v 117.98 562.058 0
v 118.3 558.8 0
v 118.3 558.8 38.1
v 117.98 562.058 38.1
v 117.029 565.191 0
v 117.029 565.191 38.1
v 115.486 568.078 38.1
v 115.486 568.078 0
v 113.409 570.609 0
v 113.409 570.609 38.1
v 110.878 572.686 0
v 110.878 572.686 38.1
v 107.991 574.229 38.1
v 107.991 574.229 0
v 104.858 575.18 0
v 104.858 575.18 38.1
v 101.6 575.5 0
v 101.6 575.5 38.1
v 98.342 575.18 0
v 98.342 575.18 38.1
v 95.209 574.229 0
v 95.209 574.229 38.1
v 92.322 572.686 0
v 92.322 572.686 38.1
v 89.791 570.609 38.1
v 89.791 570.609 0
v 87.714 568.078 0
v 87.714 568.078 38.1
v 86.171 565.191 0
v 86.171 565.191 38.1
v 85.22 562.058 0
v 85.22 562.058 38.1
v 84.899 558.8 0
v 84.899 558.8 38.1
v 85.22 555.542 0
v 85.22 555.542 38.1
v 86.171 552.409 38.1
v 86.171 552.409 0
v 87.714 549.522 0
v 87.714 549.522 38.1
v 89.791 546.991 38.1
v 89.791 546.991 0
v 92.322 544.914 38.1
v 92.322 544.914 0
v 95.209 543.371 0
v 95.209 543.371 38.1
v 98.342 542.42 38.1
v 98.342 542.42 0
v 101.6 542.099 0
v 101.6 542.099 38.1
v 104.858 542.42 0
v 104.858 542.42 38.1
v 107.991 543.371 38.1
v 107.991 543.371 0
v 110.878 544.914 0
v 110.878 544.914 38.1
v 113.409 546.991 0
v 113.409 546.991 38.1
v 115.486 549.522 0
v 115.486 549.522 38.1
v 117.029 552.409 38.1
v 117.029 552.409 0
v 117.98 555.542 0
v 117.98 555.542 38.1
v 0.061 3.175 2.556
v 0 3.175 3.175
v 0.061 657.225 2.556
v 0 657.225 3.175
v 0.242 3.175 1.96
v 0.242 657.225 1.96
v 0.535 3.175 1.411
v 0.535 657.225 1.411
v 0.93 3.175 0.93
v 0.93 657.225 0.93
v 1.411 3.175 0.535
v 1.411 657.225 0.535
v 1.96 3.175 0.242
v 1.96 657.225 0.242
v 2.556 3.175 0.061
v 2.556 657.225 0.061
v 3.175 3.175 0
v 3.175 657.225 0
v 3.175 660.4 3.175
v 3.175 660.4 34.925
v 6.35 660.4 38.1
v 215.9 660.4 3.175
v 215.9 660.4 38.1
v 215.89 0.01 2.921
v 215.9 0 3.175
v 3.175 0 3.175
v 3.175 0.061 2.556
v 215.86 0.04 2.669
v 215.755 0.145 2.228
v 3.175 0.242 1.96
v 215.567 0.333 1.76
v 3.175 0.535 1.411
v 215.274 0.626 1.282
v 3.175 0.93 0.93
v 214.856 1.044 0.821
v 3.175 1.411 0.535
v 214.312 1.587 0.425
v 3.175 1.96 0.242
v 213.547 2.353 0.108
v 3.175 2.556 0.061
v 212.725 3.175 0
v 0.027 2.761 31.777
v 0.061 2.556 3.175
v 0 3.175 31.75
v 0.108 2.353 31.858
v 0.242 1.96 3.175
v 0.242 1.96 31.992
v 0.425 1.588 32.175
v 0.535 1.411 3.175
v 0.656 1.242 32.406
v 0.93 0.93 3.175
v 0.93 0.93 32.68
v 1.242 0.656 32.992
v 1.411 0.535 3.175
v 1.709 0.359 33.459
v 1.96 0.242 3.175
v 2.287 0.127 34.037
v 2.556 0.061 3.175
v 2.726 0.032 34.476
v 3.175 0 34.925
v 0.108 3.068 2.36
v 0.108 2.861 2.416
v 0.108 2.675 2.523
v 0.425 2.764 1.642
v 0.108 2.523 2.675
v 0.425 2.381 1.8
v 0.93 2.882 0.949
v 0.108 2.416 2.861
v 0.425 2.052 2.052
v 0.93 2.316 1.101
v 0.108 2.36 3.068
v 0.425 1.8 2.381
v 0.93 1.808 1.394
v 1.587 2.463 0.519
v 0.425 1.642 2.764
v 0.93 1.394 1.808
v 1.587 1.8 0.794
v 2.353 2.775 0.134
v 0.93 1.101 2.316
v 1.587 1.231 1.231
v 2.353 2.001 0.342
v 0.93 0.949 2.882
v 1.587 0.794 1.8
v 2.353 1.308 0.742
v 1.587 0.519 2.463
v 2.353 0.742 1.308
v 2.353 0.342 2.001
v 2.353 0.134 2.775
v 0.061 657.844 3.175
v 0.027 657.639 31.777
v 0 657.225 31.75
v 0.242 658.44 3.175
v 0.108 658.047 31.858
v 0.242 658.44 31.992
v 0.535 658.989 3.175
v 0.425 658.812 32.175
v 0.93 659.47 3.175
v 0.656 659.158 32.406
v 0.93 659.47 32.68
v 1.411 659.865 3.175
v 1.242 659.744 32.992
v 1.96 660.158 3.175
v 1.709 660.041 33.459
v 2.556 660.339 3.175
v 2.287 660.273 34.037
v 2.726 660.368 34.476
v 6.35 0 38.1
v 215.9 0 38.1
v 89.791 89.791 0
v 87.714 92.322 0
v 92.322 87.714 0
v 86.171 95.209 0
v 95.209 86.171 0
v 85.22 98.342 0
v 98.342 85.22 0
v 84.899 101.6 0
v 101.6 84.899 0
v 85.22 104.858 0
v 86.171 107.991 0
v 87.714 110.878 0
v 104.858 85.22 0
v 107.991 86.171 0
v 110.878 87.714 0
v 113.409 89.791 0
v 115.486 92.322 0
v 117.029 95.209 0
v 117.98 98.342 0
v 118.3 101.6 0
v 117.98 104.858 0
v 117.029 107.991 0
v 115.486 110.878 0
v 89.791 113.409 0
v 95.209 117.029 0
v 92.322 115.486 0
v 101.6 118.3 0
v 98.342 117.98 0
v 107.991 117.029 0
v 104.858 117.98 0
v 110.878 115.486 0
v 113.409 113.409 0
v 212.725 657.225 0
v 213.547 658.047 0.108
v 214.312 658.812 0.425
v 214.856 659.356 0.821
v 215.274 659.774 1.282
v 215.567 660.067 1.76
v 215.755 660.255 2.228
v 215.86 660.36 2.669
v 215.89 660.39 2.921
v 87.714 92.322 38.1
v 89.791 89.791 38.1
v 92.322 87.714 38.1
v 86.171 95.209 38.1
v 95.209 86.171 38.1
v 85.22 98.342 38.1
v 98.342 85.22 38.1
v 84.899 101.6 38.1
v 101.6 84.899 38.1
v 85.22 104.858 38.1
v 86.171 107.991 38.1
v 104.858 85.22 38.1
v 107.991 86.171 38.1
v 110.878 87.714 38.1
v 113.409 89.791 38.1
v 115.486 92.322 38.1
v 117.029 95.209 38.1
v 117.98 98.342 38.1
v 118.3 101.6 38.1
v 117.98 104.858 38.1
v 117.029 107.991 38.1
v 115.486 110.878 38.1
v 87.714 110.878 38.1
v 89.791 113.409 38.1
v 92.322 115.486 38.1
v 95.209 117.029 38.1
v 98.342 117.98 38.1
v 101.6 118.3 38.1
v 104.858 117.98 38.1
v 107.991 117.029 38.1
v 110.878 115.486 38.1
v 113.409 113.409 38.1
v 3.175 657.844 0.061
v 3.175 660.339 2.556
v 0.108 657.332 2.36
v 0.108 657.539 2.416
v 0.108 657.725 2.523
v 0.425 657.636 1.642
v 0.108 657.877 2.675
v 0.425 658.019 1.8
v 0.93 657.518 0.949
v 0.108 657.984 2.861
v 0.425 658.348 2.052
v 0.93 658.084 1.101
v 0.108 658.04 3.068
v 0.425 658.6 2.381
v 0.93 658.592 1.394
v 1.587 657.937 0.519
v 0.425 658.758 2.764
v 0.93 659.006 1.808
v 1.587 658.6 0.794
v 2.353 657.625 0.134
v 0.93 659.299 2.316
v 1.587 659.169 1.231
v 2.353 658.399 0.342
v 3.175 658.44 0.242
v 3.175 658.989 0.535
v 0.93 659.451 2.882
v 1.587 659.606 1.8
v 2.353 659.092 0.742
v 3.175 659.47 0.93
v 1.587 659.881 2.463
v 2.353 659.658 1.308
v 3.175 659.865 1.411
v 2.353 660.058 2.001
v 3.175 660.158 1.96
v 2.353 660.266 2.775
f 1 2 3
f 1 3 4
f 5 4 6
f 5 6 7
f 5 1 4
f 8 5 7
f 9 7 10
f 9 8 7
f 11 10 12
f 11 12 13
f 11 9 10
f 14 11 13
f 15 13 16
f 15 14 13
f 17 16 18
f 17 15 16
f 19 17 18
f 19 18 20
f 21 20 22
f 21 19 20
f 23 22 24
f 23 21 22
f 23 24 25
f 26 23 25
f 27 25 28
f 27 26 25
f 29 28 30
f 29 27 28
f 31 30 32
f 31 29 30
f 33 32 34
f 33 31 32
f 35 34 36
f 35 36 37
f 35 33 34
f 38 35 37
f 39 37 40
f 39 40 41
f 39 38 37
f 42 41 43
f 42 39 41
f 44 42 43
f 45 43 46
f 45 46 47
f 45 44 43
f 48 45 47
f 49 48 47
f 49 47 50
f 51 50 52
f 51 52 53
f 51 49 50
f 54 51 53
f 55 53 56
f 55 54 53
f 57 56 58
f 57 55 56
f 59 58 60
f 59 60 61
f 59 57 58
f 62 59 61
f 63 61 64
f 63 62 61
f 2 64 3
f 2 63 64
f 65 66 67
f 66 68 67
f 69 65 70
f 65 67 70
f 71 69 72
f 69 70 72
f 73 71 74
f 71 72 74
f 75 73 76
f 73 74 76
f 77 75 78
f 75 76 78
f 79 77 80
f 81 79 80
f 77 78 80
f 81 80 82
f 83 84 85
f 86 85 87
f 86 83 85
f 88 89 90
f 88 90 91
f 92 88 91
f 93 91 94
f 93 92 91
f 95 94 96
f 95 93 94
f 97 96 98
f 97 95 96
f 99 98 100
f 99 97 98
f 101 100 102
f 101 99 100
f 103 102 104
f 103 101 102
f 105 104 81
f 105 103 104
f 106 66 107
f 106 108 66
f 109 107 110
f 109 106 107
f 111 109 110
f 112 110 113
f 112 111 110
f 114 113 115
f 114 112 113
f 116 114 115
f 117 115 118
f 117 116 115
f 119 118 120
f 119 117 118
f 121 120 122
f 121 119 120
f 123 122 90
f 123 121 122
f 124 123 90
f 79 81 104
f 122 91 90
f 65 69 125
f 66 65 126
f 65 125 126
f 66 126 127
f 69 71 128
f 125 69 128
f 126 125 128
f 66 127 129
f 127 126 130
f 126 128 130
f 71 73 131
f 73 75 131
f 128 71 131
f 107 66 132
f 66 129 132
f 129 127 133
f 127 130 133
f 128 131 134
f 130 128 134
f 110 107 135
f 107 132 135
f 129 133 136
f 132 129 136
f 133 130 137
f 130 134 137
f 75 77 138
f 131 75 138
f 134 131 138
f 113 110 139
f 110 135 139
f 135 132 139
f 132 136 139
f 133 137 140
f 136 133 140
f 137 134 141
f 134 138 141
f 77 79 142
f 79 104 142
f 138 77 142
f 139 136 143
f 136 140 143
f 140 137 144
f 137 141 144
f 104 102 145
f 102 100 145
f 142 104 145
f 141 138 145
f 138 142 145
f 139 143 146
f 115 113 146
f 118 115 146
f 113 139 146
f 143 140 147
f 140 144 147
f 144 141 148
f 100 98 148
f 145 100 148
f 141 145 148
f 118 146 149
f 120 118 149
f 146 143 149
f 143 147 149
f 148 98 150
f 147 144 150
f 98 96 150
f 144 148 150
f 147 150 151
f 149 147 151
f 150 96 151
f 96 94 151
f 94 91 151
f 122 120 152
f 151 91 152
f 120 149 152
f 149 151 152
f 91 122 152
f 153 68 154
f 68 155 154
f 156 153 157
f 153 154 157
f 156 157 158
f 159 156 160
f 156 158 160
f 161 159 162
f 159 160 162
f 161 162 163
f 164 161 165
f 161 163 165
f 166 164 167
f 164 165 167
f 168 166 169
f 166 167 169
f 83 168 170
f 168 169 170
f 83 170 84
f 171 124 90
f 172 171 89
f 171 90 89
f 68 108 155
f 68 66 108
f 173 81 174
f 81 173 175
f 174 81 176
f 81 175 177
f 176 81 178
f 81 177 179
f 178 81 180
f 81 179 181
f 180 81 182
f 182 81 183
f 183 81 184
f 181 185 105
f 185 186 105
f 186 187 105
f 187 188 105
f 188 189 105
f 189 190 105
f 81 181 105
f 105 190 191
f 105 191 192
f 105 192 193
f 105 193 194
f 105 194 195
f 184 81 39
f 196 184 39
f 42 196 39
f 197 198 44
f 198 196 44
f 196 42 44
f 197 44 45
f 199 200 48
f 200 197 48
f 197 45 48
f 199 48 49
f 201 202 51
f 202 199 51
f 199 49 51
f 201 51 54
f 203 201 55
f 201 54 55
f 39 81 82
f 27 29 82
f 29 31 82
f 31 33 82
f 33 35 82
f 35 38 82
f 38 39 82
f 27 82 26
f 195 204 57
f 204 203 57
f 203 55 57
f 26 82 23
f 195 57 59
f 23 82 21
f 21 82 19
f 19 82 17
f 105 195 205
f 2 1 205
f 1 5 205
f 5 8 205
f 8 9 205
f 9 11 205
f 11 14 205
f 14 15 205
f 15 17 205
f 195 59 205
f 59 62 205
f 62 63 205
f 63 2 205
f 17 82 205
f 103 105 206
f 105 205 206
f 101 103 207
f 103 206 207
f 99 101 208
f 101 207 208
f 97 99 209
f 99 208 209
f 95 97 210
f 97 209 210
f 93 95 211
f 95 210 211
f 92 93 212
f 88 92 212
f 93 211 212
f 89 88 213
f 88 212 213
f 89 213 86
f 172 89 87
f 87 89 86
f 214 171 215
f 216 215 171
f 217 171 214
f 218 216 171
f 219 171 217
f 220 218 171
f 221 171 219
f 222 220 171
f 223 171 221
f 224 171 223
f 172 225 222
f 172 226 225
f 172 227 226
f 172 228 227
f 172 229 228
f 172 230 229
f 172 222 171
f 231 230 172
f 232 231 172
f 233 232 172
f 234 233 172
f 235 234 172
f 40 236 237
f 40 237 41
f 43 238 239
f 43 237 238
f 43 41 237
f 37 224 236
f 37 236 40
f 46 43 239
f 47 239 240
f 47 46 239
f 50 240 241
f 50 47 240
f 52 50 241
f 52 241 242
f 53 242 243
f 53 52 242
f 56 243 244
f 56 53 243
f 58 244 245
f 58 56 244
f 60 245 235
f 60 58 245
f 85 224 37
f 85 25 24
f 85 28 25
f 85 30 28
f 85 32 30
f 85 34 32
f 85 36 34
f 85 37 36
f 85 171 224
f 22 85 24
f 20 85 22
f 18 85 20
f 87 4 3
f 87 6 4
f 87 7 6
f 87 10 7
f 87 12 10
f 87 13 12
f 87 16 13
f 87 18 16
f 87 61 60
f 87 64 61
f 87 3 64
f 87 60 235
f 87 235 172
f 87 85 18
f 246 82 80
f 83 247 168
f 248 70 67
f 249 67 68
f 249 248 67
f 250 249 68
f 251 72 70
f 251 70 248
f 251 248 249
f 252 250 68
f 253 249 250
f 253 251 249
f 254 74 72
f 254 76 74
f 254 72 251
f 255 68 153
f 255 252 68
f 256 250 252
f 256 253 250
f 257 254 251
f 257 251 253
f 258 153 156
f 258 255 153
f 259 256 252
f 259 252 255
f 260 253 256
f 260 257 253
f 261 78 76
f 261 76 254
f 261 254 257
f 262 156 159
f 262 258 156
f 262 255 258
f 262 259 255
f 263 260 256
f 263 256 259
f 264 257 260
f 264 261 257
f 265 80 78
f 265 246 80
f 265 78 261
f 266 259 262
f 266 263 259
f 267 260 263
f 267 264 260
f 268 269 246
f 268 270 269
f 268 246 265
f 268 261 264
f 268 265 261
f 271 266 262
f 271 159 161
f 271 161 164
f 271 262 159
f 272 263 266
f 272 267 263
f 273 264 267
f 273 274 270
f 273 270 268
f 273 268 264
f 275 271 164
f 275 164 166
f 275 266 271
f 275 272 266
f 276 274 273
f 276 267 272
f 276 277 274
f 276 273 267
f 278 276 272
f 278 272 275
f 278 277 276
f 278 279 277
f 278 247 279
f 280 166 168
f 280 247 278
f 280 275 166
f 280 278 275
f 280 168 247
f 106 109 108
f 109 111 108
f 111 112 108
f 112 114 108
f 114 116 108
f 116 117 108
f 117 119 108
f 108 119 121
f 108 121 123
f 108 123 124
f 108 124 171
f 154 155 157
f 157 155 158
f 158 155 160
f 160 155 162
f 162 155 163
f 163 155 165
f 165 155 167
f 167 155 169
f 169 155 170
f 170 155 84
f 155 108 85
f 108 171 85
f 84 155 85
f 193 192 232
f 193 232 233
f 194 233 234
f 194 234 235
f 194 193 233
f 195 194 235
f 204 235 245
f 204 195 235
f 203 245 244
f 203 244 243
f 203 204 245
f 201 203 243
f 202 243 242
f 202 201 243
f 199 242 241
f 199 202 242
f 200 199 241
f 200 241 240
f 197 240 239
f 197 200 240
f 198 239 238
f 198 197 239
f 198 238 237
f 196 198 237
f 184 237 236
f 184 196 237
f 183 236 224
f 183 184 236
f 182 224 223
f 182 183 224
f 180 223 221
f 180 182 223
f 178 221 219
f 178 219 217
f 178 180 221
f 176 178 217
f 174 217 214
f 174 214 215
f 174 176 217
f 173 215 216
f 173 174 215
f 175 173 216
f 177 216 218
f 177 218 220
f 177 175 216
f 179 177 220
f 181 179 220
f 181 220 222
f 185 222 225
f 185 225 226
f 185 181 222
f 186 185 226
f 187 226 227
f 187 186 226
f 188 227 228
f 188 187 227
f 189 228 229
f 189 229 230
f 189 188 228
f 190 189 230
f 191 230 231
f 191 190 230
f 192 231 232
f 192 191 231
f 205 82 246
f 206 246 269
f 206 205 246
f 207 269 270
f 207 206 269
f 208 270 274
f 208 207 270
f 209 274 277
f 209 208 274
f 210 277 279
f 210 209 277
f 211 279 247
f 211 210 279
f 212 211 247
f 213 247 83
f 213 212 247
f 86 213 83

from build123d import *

# Parameters (mm, degrees)
F0_W     = 215.9
F0_H     = 660.4
F0_R     = 16.7005
F1_DEPTH = 38.1
F2_SIZE  = 6.35
F3_R     = 3.175


with BuildPart() as f1:
    # F0 (on Top) → F1 (new body)
    with BuildSketch(Plane.XY):
        with Locations((107.95, 330.2)):
            Rectangle(F0_W, F0_H)
        with Locations((101.6, 101.6)):
            Circle(F0_R, mode=Mode.SUBTRACT)
        with Locations((101.6, 558.8)):
            Circle(F0_R, mode=Mode.SUBTRACT)
    extrude(amount=F1_DEPTH)

    # F2
    f2_edges = [f1.edges().sort_by_distance(p)[0] for p in [
        (0, 330.2, 38.1),
    ]]
    chamfer(f2_edges, length=F2_SIZE)

    # F3
    f3_edges = [f1.edges().sort_by_distance(p)[0] for p in [
        (215.9, 330.2, 0),
        (107.95, 660.4, 0),
        (107.95, 0, 0),
        (0, 330.2, 0),
        (0, 0, 15.875),
        (0, 660.4, 15.875),
    ]]
    fillet(f3_edges, radius=F3_R)


solid = f1.part
